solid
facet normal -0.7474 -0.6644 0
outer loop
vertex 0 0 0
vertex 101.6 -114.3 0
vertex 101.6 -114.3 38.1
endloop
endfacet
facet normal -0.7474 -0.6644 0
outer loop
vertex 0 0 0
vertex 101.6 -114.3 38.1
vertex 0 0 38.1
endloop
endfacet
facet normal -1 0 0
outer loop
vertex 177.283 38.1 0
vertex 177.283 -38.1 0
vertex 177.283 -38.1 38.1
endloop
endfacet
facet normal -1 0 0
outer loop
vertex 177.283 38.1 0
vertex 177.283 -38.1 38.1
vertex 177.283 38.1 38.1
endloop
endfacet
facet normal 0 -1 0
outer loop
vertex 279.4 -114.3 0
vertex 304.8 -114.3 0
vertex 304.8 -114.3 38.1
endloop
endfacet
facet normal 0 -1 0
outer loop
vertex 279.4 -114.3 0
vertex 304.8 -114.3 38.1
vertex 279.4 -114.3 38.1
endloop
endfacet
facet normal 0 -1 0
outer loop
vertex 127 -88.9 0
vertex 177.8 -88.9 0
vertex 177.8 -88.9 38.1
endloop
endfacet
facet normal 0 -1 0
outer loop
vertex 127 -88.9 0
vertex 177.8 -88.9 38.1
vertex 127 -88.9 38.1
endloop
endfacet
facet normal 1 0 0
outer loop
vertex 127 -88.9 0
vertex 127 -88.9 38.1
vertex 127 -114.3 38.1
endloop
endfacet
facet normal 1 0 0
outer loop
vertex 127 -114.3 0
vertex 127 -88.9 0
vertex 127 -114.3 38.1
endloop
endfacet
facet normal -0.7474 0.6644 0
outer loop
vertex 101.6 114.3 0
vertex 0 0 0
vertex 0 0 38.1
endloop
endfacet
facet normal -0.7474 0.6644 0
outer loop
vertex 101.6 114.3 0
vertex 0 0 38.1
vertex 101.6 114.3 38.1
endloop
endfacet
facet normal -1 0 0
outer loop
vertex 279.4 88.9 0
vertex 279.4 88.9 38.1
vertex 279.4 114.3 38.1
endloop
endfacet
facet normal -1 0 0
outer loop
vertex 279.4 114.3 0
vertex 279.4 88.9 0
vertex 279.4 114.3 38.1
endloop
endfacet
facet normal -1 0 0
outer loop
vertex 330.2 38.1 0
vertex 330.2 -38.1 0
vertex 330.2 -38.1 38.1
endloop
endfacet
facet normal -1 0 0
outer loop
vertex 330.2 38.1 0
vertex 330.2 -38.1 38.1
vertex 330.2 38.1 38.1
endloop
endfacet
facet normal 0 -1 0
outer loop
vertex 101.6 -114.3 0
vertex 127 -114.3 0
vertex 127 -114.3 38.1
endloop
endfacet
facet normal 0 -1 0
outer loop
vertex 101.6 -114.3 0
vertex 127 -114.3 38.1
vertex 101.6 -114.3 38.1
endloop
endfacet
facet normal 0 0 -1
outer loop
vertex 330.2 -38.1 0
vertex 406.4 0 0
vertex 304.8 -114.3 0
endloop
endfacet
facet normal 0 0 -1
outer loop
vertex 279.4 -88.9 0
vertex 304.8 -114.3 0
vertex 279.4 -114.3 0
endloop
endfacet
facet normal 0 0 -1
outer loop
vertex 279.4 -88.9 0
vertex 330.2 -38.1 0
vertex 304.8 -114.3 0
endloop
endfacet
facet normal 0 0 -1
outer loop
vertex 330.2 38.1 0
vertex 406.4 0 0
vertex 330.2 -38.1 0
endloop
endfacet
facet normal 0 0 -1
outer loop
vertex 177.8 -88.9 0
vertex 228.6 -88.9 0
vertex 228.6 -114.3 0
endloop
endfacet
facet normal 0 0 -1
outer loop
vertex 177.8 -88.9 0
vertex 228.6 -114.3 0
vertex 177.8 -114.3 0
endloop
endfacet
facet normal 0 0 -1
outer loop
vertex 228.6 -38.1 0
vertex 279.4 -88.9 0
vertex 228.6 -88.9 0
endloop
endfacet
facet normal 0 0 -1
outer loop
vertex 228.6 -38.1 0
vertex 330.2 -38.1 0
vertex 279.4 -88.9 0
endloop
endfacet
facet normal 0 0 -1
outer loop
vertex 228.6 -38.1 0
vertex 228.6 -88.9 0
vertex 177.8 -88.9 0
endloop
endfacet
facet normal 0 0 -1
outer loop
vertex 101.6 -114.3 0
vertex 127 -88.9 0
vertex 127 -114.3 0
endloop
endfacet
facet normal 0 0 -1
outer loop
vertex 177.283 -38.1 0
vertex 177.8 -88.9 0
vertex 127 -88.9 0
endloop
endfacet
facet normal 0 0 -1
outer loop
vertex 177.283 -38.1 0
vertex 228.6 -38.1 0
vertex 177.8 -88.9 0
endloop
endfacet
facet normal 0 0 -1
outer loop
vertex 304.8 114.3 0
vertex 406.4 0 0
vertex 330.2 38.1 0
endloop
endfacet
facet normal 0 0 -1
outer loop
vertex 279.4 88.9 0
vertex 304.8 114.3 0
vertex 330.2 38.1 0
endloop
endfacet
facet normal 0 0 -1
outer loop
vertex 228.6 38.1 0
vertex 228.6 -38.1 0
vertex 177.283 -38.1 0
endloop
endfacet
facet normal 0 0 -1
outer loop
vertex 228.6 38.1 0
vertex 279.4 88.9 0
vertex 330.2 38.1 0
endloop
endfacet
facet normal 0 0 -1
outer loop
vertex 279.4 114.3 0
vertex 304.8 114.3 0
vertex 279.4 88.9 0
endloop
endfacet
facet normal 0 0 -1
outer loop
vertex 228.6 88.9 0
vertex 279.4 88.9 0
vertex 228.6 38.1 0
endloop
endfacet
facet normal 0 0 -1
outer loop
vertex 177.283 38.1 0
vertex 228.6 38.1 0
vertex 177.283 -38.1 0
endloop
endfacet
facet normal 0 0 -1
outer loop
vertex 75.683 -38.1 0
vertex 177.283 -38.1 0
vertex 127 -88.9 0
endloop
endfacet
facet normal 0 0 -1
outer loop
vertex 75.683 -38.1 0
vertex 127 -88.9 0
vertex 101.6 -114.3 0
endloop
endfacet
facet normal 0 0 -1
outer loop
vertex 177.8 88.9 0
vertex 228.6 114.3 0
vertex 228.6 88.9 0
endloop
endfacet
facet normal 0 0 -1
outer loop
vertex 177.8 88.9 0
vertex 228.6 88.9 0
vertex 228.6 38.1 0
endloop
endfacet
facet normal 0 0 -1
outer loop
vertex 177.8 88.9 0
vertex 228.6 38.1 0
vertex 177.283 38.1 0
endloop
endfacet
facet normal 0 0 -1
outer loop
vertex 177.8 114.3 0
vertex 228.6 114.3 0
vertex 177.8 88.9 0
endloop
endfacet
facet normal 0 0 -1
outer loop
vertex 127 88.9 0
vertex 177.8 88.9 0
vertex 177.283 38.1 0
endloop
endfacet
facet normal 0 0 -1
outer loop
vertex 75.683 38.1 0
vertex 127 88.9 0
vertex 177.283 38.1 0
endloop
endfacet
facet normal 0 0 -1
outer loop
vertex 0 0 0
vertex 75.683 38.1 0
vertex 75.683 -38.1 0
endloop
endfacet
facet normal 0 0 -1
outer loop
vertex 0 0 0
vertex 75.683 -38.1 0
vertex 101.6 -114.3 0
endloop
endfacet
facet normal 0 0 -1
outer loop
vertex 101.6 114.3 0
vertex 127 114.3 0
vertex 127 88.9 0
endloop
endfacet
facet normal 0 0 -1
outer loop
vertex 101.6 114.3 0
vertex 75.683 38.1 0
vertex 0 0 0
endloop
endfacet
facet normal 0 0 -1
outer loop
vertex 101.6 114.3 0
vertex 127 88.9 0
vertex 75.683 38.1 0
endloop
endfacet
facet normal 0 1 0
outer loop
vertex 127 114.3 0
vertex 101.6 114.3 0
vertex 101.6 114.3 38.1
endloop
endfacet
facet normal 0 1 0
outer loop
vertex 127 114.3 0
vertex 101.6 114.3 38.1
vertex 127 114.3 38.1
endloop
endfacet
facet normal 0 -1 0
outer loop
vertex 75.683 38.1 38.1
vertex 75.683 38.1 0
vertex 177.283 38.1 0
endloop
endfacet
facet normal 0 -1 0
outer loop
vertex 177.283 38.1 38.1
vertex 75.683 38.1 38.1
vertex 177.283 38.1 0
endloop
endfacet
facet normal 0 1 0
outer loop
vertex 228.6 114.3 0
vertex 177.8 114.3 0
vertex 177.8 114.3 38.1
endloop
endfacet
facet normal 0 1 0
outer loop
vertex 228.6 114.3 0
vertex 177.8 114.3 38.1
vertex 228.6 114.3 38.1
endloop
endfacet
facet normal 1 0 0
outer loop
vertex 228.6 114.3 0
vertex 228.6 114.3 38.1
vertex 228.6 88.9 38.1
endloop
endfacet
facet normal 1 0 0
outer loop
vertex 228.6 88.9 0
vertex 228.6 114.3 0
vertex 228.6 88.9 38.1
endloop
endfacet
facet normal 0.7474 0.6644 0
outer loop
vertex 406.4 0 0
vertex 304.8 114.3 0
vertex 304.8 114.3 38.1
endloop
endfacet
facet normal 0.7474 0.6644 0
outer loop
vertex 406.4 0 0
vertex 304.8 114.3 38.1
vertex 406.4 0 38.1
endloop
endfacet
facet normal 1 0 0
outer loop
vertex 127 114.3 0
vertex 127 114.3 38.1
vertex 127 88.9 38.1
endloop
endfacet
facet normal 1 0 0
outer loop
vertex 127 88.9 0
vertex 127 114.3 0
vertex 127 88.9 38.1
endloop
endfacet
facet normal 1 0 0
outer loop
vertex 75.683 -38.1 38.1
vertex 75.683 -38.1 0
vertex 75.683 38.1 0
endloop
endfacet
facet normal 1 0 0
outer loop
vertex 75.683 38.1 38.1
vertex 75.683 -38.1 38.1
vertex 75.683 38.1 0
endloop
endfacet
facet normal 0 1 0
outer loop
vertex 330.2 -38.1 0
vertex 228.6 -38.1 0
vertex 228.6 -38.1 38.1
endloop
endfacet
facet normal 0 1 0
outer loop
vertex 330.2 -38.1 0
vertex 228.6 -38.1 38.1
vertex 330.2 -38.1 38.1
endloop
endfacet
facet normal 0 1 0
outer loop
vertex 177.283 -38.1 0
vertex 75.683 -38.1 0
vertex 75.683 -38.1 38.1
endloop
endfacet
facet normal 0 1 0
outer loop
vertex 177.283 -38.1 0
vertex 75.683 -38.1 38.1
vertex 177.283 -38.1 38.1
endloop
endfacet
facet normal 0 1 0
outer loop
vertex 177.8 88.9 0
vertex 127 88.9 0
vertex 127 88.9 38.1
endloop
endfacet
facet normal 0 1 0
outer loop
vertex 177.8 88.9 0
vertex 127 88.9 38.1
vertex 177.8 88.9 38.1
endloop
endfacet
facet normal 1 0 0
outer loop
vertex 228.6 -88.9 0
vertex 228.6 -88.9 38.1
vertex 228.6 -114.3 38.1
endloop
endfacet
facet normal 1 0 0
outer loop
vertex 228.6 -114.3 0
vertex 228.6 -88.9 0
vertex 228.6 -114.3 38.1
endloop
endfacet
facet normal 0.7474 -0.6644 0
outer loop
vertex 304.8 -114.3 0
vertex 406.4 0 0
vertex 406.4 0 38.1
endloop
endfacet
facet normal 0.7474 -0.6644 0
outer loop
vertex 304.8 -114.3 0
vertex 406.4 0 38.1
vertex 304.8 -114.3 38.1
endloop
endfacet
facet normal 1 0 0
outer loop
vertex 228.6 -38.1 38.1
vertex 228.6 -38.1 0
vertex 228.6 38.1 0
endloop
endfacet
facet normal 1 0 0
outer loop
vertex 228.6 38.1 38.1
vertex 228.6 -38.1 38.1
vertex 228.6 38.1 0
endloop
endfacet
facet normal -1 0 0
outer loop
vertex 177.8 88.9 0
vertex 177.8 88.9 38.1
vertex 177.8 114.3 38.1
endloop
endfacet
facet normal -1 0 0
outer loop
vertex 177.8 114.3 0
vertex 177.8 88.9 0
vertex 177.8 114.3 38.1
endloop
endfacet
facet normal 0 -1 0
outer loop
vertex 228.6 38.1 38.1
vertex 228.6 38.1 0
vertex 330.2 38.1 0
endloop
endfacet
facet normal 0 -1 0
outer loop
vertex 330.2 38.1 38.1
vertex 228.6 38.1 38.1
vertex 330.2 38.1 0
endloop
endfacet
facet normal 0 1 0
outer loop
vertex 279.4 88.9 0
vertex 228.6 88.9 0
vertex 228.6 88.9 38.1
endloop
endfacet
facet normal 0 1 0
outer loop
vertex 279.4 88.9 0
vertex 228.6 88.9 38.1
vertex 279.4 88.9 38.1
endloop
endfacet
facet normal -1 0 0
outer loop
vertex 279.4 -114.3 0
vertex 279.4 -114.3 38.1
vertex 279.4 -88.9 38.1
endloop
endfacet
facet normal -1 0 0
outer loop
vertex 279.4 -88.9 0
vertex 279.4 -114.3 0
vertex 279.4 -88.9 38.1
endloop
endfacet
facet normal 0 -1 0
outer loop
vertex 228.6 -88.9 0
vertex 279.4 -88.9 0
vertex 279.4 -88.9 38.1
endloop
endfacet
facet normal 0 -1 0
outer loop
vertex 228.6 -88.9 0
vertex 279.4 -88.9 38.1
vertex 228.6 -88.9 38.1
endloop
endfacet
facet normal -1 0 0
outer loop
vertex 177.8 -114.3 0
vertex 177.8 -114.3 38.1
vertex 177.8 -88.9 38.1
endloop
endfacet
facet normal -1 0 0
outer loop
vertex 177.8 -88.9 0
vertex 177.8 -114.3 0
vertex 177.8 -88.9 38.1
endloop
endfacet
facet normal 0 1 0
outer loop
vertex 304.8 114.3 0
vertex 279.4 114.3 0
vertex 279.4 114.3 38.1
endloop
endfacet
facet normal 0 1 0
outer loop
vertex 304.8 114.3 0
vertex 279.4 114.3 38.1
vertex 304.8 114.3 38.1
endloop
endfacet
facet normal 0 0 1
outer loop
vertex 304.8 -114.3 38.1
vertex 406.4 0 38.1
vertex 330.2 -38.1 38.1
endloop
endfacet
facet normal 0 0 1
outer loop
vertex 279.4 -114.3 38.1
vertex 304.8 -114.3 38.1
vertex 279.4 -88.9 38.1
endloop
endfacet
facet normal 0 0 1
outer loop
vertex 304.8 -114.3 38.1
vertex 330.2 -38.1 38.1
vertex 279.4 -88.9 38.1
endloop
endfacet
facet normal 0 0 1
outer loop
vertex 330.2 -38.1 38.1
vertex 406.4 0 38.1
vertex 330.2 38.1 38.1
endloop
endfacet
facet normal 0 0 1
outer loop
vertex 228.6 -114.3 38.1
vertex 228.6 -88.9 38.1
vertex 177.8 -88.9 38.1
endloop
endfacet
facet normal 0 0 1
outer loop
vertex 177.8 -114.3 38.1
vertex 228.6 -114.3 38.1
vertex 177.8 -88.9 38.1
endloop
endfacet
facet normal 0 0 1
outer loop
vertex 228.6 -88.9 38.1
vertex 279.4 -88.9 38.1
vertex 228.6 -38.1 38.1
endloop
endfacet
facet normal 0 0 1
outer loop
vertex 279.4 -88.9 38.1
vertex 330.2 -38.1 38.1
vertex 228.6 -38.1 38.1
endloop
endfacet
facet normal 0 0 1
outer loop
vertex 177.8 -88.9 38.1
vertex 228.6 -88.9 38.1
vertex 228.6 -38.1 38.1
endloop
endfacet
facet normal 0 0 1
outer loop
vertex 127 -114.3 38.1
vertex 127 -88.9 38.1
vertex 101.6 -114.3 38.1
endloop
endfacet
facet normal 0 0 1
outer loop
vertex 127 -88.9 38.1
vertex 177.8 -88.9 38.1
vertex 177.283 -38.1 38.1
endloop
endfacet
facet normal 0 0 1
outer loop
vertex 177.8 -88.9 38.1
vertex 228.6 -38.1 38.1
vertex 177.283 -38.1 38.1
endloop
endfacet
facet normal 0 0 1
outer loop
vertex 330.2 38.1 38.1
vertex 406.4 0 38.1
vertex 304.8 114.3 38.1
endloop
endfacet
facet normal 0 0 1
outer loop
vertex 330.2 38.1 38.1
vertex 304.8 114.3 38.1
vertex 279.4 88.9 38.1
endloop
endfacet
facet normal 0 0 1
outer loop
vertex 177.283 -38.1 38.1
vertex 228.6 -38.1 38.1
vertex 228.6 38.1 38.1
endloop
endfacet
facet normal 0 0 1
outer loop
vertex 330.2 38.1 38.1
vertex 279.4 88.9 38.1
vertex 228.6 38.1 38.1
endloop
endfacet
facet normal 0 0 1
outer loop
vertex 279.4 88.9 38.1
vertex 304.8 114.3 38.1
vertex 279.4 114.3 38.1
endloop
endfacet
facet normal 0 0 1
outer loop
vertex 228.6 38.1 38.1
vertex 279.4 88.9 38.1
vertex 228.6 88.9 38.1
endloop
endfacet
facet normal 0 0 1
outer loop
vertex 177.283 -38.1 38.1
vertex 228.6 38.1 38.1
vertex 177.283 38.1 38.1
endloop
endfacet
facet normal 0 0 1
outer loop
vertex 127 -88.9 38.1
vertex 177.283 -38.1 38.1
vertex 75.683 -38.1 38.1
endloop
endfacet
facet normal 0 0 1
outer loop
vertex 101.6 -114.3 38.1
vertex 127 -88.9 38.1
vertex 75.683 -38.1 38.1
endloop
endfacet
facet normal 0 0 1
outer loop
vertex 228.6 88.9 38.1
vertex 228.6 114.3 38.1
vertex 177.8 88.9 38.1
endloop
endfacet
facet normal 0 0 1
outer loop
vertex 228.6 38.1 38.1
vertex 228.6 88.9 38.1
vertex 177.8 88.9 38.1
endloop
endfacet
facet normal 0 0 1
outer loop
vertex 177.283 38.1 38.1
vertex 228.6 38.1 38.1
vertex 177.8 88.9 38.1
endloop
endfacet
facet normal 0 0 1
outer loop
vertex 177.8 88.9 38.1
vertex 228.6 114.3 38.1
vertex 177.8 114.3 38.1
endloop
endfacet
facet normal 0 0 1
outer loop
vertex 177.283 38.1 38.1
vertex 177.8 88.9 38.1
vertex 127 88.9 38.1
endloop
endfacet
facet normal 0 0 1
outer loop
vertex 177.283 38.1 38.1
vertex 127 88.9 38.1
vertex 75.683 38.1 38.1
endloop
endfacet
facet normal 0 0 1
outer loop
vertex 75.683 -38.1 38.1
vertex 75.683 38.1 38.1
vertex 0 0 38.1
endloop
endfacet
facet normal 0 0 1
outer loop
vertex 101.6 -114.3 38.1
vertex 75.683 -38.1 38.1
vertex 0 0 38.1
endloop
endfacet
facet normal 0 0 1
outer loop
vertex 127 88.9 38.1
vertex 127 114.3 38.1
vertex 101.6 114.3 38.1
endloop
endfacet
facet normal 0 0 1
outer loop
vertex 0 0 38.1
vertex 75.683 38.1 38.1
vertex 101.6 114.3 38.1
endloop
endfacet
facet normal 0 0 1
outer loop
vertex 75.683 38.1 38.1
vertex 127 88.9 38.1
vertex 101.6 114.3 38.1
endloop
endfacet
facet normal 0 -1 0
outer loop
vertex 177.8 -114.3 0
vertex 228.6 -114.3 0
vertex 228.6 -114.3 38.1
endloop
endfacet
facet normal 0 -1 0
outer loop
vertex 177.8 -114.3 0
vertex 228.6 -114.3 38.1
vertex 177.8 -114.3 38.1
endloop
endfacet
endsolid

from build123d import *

# Parameters (mm, degrees)
SKETCH1_W           = 101.6
SKETCH1_H           = 76.2
BOSS_EXTRUDE1_DEPTH = 38.1


with BuildPart() as part:
    # Sketch1 → Boss-Extrude1 (new body)
    with BuildSketch(Plane.XY):
        Polygon((0, 0), (101.6, 114.3), (127, 114.3), (127, 88.9), (177.8, 88.9), (177.8, 114.3), (228.6, 114.3), (228.6, 88.9), (279.4, 88.9), (279.4, 114.3), (304.8, 114.3), (406.4, 0), (304.8, -114.3), (279.4, -114.3), (279.4, -88.9), (228.6, -88.9), (228.6, -114.3), (177.8, -114.3), (177.8, -88.9), (127, -88.9), (127, -114.3), (101.6, -114.3), align=None)
        with Locations((126.483076325, 0)):
            Rectangle(SKETCH1_W, SKETCH1_H, mode=Mode.SUBTRACT)
        with Locations((279.4, 0)):
            Rectangle(SKETCH1_W, SKETCH1_H, mode=Mode.SUBTRACT)
    extrude(amount=BOSS_EXTRUDE1_DEPTH)


solid = part.part
